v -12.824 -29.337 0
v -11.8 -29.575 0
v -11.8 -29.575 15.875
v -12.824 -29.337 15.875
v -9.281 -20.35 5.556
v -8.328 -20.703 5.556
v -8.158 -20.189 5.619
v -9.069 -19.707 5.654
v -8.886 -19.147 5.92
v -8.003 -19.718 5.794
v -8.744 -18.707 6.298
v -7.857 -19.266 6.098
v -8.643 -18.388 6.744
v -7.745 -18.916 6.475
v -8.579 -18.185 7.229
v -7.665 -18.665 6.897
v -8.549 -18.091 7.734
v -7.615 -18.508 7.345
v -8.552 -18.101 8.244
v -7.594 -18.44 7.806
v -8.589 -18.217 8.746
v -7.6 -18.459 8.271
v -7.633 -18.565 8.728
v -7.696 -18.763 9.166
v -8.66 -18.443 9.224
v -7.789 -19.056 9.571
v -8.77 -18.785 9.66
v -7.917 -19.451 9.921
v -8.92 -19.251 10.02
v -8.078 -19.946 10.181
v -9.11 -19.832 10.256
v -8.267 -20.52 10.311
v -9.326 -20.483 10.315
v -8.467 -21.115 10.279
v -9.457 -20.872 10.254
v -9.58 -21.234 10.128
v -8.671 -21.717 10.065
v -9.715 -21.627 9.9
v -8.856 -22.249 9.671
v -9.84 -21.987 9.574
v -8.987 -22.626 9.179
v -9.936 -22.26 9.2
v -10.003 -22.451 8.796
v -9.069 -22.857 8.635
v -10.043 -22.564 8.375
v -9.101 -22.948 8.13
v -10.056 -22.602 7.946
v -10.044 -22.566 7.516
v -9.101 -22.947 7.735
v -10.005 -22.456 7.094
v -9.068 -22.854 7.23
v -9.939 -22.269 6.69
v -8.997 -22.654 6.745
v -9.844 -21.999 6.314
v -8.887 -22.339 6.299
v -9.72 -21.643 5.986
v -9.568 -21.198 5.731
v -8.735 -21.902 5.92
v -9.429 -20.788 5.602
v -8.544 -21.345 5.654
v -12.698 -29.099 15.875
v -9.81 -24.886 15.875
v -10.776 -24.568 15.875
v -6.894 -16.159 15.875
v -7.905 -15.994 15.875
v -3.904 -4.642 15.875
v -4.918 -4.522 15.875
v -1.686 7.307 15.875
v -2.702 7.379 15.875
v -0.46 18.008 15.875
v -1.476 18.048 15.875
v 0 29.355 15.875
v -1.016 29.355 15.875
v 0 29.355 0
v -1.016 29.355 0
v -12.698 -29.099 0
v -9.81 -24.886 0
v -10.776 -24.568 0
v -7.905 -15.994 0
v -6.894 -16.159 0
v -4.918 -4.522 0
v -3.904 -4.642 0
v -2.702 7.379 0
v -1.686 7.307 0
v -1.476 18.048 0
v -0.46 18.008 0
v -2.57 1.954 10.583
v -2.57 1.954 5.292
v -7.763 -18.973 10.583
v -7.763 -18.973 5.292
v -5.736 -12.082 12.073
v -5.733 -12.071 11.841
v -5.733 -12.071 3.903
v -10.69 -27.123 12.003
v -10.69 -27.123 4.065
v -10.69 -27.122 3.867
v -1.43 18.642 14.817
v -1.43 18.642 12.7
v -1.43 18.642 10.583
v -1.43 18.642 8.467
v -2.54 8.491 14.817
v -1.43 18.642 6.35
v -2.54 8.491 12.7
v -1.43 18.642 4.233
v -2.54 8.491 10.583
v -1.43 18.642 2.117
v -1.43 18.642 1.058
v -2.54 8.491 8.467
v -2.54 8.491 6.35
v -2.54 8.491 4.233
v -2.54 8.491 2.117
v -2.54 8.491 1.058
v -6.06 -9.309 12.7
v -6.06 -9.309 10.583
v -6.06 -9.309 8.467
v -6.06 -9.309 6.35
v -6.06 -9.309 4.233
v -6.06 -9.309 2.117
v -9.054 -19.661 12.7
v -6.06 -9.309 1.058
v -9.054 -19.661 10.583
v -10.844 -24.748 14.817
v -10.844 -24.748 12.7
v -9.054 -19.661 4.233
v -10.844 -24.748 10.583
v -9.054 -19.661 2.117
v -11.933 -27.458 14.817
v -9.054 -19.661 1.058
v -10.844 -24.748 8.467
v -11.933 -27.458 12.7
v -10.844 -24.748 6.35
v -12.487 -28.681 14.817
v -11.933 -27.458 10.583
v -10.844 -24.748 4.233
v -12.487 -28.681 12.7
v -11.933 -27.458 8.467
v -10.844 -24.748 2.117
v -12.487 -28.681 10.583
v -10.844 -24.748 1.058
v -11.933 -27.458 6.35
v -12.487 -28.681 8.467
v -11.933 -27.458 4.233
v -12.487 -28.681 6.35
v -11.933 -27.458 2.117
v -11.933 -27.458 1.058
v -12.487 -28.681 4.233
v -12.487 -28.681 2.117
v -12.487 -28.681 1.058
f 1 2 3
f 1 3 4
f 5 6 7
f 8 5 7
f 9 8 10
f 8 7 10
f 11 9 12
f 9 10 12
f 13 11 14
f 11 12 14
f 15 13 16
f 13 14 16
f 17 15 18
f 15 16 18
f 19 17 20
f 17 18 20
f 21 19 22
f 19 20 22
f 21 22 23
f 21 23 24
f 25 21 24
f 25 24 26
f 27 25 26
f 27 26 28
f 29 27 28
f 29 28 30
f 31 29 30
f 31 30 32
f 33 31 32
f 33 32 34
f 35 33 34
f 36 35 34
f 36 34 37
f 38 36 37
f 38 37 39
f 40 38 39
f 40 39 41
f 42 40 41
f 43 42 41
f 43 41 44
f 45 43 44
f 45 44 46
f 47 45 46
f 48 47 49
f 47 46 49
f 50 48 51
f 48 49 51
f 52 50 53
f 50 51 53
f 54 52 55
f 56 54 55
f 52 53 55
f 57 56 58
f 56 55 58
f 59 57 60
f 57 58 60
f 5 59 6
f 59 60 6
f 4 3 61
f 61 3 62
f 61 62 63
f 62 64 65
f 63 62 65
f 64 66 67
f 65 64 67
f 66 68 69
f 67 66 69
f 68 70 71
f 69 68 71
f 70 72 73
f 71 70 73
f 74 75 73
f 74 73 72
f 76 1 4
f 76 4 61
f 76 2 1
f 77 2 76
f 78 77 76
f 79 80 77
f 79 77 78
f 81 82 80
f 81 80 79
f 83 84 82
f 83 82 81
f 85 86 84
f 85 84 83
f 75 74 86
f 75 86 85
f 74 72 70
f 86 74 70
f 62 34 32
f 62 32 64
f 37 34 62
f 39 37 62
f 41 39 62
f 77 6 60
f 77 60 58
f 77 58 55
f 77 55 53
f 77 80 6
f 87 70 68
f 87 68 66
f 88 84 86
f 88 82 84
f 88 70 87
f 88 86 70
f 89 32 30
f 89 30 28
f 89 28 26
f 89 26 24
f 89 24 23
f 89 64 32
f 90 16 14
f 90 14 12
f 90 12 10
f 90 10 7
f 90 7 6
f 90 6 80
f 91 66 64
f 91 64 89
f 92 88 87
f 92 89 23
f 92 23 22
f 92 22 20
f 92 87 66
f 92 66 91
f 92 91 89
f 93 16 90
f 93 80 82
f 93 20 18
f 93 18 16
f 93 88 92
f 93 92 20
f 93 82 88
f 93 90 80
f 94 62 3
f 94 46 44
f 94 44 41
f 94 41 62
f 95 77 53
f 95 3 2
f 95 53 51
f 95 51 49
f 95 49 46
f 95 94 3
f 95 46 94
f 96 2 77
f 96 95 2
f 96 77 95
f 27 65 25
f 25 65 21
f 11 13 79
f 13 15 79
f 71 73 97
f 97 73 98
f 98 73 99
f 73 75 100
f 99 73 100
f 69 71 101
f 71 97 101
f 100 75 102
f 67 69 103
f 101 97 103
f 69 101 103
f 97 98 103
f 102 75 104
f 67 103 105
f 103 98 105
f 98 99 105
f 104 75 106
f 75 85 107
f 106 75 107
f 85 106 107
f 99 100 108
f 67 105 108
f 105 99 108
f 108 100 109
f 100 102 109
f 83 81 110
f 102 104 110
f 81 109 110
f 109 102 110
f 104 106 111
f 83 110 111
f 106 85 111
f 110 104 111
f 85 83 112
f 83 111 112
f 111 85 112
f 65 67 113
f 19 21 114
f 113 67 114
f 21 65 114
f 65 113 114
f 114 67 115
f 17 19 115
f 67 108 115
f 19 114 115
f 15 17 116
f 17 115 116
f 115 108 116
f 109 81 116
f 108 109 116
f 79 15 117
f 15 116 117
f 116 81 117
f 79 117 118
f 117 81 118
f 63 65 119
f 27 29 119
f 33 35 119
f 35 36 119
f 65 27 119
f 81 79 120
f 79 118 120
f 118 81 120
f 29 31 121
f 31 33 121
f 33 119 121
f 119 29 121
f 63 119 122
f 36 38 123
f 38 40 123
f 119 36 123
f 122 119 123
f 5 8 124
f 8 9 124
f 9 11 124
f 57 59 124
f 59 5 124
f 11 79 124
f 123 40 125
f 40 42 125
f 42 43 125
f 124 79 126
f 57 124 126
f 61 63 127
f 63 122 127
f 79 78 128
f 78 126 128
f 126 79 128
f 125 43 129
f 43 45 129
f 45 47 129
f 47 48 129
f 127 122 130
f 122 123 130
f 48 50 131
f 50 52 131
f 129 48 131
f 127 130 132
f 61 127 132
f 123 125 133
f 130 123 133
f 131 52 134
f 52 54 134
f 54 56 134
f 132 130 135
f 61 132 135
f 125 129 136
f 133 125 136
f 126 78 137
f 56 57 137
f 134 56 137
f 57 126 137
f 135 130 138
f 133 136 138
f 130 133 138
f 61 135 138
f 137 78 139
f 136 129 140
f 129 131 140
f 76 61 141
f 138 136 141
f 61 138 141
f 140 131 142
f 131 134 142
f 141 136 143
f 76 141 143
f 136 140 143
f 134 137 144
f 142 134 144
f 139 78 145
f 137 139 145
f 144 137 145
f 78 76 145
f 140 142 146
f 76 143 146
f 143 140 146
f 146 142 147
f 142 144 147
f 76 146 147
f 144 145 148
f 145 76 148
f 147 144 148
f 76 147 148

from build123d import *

# Parameters (mm, degrees)
BOSS_EXTRUDE1_DEPTH = 15.875
SKETCH3_R           = 2.38125
CUT_EXTRUDE1_DEPTH  = 22.710547331


with BuildPart() as part:
    # Sketch1 → Boss-Extrude1 (new body)
    with BuildSketch(Plane.XY):
        with BuildLine():
            Line((-1.016, 29.355277439), (0, 29.355277439))
            add(Edge.make_bspline(
                [(0, 29.355277439), (0, 0), (-9.599644928, -25.418345845), (-11.80014336, -29.574736835)],
                knots=[0, 0, 0, 0, 1, 1, 1, 1], degree=3))
            Line((-11.80014336, -29.574736835), (-12.82390686, -29.337045136))
            Line((-12.82390686, -29.337045136), (-12.698066868, -29.099353437))
            add(Edge.make_bspline(
                [(-1.016, 29.355277439), (-1.016, 27.550326556), (-1.090433728, 23.915187486), (-1.504306808, 16.855354767), (-2.457039545, 8.361518974), (-4.099428394, -1.056476565), (-6.042674076, -9.505599636), (-7.747097747, -15.565843862), (-9.061893662, -19.723126975), (-9.998550617, -22.469633369), (-10.860488882, -24.818373274), (-11.495244143, -26.421861441), (-11.9392839, -27.477329912), (-12.237192952, -28.15188839), (-12.451060525, -28.609168554), (-12.602329361, -28.915317146), (-12.664333464, -29.035636411), (-12.698066868, -29.099353437)],
                knots=[0, 0, 0, 0, 0.0625, 0.125, 0.25, 0.375, 0.5, 0.625, 0.6875, 0.75, 0.8125, 0.875, 0.90625, 0.9375, 0.96875, 0.984375, 1, 1, 1, 1], degree=3))
        make_face()
    extrude(amount=BOSS_EXTRUDE1_DEPTH)

    # Sketch3 → Cut-Extrude1 (cut, through all)
    with BuildSketch(Plane(origin=(-9.637227011, -24.424781037, 8.010581608), x_dir=(0, 0, -1), z_dir=(0.937440941, -0.348144342, 0))):
        with Locations((0.073081608, 3.944213504)):
            Circle(SKETCH3_R)
    extrude(amount=-CUT_EXTRUDE1_DEPTH, mode=Mode.SUBTRACT)


solid = part.part
